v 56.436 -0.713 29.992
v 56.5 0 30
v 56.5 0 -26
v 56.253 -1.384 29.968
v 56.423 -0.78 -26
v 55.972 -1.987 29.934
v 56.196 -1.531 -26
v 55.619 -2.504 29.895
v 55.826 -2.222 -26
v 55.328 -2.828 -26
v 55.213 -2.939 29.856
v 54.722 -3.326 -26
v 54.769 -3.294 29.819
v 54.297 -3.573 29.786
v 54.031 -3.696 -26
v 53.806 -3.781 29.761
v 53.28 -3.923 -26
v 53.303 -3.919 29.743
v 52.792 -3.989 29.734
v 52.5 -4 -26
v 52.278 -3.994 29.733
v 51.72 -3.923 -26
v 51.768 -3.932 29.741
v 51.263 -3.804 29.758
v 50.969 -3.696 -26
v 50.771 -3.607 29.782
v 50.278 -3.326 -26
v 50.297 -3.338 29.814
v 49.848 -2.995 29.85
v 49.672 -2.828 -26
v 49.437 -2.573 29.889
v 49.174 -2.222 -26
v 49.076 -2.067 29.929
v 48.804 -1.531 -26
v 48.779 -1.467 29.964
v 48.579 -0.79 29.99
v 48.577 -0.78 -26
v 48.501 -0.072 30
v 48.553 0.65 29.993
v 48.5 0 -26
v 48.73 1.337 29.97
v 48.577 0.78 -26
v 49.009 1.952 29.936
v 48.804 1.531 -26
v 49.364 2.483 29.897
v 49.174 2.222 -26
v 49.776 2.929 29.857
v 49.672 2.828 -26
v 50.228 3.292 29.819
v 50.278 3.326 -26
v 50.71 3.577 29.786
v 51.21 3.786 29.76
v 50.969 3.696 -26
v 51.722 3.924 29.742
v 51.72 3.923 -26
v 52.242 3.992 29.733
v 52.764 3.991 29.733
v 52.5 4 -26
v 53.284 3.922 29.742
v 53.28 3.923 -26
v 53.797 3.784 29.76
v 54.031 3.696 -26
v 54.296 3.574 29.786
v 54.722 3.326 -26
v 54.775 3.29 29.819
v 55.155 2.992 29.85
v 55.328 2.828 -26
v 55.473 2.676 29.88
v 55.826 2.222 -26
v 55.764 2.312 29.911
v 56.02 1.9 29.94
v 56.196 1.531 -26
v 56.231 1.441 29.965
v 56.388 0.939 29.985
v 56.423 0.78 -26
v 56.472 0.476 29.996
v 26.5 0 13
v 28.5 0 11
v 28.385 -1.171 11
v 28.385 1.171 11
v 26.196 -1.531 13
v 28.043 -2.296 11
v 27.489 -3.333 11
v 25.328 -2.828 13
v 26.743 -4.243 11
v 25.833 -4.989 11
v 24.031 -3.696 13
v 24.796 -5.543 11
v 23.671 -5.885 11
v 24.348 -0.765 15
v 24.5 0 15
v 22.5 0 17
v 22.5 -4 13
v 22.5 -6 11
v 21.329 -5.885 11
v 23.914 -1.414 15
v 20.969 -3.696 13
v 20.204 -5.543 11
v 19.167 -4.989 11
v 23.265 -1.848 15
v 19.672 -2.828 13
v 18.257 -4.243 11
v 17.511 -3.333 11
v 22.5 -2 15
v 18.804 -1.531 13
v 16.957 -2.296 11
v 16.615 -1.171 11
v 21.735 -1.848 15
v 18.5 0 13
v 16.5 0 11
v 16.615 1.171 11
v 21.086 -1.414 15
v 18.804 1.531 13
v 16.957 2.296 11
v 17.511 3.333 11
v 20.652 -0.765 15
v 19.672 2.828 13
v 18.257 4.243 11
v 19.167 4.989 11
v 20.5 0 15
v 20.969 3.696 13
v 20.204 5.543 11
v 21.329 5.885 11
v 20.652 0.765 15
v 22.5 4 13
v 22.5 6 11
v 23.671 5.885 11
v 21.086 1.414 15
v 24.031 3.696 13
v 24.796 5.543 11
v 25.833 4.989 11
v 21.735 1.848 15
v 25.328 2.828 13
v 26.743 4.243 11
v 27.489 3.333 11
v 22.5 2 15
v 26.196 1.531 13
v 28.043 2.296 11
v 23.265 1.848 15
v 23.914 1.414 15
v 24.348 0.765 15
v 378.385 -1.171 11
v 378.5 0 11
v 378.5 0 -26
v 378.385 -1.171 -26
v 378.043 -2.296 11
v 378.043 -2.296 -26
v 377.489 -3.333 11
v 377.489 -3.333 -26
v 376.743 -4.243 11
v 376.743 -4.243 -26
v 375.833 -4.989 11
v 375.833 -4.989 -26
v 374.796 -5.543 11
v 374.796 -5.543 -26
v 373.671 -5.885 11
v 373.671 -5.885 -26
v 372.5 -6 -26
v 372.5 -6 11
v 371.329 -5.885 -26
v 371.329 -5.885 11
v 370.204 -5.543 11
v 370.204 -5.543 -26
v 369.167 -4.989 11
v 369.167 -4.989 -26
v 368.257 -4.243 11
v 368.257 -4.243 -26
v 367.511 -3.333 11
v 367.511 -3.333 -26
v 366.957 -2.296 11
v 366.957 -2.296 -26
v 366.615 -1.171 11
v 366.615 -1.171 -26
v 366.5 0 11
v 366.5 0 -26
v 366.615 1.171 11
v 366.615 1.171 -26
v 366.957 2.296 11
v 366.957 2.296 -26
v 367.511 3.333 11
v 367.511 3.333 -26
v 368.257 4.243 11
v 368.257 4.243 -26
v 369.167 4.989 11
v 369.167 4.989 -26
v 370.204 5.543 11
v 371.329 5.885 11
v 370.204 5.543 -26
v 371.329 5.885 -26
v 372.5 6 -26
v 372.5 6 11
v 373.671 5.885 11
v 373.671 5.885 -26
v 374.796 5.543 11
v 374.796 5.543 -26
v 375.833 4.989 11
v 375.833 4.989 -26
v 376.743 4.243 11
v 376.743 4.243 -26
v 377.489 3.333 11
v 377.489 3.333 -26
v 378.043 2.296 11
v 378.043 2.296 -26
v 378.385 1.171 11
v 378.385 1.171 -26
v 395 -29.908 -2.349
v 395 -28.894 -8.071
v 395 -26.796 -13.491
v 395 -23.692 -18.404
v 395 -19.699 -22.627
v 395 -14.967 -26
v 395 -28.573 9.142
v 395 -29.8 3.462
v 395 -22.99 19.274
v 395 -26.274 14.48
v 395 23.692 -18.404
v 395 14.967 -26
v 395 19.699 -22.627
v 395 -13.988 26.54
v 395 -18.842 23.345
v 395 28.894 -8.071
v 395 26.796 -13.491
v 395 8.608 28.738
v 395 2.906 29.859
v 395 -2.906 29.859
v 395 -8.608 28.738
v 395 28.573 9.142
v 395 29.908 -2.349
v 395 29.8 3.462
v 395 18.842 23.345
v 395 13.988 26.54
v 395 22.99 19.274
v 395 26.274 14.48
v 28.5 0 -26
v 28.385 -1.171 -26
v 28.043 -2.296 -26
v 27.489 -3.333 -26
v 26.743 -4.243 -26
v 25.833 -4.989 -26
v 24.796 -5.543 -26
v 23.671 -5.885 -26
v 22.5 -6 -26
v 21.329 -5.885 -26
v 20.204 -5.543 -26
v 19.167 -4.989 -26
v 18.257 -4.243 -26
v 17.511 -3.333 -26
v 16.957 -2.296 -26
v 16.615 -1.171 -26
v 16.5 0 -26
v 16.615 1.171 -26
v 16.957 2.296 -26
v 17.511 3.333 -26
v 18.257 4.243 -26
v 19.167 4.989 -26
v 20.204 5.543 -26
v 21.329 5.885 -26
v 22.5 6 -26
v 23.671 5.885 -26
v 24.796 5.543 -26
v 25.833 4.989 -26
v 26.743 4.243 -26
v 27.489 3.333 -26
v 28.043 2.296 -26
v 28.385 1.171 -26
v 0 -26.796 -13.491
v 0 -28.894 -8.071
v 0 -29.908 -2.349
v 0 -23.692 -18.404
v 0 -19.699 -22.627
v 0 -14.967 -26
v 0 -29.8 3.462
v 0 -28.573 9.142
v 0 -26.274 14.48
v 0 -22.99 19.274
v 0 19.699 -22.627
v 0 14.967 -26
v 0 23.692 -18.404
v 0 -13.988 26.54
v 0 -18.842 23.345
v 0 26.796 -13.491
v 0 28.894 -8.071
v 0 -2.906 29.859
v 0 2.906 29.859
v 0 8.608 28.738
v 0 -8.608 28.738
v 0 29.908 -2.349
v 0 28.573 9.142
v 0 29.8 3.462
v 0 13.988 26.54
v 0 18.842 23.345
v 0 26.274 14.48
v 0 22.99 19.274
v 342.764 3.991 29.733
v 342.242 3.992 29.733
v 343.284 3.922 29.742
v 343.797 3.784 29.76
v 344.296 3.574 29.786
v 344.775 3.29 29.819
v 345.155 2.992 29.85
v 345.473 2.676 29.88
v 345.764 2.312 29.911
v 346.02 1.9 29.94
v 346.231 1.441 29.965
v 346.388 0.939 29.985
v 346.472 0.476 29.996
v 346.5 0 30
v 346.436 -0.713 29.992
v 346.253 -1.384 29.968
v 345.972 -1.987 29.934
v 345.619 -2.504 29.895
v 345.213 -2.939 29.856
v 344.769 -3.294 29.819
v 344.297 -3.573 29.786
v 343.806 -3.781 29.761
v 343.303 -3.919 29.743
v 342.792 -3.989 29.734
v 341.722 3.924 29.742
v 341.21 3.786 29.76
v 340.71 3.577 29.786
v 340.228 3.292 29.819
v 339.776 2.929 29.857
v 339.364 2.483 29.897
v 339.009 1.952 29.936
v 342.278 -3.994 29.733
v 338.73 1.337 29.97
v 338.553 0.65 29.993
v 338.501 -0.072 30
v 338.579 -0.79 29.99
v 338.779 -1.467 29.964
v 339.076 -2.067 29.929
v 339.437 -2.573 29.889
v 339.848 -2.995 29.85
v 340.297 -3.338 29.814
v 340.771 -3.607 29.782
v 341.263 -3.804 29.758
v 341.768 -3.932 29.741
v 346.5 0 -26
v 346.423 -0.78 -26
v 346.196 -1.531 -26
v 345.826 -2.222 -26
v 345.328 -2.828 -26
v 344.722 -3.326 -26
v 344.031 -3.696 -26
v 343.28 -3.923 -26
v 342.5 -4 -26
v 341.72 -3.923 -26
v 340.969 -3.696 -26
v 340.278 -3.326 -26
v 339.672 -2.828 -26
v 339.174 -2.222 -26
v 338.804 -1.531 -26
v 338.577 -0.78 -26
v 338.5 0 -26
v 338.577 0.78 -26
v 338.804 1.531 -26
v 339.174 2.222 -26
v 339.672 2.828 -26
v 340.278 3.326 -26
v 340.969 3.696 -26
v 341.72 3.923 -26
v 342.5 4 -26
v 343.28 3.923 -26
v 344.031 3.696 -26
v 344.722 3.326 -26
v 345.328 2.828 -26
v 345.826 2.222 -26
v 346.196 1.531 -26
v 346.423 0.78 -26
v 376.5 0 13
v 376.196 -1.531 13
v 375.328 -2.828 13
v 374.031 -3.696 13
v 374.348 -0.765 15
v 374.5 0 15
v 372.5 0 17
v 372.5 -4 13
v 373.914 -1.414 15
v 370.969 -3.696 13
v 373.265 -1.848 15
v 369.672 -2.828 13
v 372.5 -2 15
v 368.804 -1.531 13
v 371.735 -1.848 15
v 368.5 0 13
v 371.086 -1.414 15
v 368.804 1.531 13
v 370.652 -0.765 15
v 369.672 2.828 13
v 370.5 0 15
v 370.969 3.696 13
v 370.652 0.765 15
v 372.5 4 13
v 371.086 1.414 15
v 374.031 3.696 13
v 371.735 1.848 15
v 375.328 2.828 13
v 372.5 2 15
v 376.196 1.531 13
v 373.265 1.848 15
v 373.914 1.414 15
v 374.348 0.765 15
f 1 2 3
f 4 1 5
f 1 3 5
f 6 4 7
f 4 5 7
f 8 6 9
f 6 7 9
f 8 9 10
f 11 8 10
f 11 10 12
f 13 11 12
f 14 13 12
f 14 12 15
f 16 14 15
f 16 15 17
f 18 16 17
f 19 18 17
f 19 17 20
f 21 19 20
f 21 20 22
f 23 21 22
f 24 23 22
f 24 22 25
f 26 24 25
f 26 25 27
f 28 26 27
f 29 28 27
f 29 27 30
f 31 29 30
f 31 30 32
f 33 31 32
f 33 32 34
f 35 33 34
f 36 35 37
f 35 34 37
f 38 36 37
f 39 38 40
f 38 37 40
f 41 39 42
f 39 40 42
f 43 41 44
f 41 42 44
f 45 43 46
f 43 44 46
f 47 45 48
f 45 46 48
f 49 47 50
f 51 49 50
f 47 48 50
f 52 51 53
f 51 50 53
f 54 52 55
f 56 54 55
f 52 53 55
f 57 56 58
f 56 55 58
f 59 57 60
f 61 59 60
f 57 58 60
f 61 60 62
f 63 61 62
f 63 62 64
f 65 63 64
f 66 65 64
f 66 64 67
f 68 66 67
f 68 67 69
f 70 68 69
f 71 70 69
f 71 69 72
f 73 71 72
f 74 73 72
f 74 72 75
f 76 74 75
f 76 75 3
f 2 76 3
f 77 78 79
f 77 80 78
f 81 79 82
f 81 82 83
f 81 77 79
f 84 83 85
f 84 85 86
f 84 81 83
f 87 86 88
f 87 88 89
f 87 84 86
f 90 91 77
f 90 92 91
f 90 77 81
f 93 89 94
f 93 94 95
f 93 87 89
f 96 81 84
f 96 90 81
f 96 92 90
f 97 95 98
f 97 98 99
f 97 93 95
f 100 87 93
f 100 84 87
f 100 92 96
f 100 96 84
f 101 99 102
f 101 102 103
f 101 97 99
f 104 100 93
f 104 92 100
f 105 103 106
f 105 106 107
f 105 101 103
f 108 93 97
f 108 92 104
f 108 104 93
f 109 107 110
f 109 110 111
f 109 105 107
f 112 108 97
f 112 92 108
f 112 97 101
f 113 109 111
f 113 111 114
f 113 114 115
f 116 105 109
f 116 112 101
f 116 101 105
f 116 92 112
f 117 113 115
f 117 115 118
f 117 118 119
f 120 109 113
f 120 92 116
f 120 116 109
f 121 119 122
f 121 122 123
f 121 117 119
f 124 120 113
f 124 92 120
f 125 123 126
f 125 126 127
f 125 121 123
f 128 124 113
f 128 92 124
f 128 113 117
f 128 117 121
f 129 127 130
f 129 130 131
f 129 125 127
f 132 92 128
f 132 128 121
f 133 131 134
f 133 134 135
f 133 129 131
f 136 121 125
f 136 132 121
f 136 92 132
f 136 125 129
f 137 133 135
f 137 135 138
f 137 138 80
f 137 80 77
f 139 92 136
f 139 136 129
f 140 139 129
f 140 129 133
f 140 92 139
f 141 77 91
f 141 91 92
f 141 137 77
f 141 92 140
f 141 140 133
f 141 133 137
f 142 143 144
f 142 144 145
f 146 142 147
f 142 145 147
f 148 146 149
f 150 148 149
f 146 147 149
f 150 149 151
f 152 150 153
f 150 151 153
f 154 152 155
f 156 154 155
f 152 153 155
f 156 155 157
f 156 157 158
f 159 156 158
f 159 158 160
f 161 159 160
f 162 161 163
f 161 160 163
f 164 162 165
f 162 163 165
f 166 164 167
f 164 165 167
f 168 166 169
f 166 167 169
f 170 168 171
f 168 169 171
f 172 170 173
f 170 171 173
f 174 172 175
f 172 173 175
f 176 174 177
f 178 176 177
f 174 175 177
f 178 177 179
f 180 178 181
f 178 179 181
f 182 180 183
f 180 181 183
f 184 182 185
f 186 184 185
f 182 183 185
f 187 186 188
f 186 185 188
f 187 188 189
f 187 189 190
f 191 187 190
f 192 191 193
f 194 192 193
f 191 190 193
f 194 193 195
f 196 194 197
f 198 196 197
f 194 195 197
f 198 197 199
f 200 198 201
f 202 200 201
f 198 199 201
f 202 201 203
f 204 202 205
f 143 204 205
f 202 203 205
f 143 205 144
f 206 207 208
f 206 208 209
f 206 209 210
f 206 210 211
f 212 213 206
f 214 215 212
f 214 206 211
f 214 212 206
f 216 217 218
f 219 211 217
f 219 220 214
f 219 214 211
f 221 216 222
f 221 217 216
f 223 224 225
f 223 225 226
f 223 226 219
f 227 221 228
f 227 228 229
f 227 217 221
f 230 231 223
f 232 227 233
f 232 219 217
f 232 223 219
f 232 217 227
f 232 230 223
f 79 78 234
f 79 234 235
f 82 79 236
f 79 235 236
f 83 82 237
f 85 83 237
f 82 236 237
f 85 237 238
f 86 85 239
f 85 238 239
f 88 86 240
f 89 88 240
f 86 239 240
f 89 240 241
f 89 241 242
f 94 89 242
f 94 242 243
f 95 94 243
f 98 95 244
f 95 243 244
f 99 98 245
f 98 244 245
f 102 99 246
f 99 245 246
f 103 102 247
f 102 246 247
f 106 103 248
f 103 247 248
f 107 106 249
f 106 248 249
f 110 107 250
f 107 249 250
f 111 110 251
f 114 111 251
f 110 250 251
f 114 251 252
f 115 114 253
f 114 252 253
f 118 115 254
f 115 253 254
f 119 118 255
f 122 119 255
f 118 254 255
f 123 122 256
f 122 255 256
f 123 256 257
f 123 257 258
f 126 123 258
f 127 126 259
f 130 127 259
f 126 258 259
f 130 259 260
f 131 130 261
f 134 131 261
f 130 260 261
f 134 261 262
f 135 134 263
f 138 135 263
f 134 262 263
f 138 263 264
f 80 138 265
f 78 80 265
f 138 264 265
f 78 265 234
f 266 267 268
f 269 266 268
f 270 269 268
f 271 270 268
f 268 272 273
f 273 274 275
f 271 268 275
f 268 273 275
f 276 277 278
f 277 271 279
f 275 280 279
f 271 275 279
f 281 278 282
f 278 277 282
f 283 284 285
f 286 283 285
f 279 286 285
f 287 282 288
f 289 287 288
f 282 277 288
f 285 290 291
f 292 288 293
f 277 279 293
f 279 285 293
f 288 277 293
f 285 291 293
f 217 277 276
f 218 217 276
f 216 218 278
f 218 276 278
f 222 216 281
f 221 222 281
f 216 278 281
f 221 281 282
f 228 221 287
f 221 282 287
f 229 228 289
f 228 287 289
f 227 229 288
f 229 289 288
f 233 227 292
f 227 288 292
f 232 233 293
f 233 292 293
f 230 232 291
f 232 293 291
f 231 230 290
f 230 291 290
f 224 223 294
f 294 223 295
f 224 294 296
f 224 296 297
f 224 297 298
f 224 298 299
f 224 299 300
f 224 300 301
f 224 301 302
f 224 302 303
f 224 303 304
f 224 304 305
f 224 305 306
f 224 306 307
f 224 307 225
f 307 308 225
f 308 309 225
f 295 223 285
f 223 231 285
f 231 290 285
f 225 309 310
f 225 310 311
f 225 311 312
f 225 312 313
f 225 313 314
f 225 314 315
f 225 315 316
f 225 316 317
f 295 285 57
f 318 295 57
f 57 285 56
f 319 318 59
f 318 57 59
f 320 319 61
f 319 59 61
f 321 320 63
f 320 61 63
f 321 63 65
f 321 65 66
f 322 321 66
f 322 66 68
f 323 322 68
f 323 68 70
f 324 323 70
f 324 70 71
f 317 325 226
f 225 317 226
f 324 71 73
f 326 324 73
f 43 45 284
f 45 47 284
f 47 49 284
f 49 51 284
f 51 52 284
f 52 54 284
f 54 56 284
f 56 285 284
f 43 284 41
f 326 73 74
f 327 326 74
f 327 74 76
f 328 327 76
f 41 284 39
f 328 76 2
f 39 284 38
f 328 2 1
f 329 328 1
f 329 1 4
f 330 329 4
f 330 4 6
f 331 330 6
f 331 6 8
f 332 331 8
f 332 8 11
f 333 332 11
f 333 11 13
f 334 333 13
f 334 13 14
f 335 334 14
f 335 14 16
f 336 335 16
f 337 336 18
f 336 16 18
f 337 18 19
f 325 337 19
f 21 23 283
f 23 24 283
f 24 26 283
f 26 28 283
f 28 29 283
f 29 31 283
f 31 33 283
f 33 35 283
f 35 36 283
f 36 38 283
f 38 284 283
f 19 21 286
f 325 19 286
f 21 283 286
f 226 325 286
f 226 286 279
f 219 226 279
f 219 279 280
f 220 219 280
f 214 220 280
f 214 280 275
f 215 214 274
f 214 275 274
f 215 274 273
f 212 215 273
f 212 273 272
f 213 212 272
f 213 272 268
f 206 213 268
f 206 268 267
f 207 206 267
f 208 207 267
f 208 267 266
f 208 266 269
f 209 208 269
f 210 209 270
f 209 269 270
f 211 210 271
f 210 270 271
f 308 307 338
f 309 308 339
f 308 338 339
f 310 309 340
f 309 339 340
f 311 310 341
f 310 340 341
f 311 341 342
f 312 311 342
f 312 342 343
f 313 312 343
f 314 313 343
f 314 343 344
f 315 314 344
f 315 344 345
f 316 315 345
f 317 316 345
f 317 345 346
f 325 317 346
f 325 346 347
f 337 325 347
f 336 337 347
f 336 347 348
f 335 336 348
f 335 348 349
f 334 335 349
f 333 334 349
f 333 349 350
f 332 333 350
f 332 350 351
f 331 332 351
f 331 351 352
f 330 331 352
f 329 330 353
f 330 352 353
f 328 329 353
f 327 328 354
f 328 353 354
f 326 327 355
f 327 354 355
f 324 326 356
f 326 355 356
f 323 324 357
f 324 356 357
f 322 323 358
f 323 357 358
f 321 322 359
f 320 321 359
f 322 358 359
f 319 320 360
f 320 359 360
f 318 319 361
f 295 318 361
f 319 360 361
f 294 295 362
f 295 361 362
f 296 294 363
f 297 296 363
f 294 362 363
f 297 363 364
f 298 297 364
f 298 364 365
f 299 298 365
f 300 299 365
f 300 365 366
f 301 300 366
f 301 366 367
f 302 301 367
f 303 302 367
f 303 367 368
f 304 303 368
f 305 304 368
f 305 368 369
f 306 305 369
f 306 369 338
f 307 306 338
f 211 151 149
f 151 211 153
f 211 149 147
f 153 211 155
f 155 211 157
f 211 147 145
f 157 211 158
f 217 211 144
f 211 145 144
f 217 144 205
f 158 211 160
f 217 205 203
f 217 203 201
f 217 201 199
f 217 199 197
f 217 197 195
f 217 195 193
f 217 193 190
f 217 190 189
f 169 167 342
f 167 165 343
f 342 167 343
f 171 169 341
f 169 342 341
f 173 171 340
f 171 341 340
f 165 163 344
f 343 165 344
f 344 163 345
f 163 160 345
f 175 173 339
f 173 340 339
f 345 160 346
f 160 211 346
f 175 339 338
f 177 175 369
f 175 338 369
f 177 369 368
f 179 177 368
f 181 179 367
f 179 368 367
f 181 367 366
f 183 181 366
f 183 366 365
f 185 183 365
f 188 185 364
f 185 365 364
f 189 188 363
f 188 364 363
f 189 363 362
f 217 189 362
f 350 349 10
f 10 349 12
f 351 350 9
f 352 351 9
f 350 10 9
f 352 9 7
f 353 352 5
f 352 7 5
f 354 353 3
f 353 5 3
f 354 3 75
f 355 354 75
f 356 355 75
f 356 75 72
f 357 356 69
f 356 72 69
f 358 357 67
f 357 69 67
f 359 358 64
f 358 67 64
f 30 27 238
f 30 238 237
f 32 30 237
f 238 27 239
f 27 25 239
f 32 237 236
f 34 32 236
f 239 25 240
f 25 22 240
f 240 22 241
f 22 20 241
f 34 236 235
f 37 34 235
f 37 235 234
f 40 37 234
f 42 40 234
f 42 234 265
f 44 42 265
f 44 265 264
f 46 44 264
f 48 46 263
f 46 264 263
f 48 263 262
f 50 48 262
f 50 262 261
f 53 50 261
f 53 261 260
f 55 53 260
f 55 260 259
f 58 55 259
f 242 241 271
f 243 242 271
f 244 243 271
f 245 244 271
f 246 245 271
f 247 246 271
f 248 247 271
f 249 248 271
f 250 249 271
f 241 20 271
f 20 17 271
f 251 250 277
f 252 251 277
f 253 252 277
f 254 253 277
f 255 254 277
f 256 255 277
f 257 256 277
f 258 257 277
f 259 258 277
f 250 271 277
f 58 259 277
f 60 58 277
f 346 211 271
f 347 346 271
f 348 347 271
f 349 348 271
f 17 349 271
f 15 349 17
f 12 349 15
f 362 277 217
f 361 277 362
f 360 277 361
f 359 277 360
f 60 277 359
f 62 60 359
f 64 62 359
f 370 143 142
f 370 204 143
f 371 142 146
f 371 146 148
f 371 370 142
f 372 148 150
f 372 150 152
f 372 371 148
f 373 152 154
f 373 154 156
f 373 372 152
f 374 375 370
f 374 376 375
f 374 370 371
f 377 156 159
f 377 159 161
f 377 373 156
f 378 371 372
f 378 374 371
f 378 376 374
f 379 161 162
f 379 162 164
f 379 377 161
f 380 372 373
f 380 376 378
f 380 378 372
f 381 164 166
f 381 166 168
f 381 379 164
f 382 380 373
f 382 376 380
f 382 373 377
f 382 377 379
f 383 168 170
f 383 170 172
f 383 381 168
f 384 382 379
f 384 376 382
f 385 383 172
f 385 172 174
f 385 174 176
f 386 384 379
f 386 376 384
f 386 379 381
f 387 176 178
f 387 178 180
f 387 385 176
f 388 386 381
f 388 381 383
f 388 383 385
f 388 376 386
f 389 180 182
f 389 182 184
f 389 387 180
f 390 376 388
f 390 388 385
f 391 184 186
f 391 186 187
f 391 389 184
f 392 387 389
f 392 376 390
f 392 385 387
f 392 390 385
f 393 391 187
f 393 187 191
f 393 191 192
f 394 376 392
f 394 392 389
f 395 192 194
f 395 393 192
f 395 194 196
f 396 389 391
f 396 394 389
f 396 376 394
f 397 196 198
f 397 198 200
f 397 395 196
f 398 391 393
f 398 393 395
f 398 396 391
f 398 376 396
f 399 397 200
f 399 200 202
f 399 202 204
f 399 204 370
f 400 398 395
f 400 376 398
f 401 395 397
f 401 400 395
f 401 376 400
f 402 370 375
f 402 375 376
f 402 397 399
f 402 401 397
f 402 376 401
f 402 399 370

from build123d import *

# Parameters (mm, degrees)
F1_DEPTH = 395
F2_R     = 6
F2_R_2   = 4
F3_DEPTH = 43
F4_R     = 4
F5_DEPTH = 71
F6_SIZE  = 6


with BuildPart() as f1:
    # F0 (on Right) → F1 (new body)
    with BuildSketch(Plane.YZ):
        with BuildLine():
            Line((-14.96663, -26), (14.96663, -26))
            ThreePointArc((14.96663, -26), (0, 30), (-14.96663, -26))
        make_face()
    extrude(amount=F1_DEPTH)

    # F2 (on face) → F3 (cut)
    with BuildSketch(Plane(origin=(0, 0, -26), x_dir=(1, 0, 0), z_dir=(0, 0, -1))):
        with Locations((372.5, 0)):
            Circle(F2_R)
        with Locations((22.5, 0)):
            Circle(F2_R)
        with Locations((52.5, 0)):
            Circle(F2_R_2)
        with Locations((342.5, 0)):
            Circle(F2_R_2)
    extrude(amount=-F3_DEPTH, mode=Mode.SUBTRACT)

    # F4 (on face) → F5 (cut)
    with BuildSketch(Plane(origin=(0, 0, -26), x_dir=(1, 0, 0), z_dir=(0, 0, -1))):
        with Locations((52.5, 0)):
            Circle(F4_R)
        with Locations((342.5, 0)):
            Circle(F4_R)
    extrude(amount=-F5_DEPTH, mode=Mode.SUBTRACT)

    # F6
    f6_edges = [f1.edges().sort_by_distance(p)[0] for p in [
        (366.5, 0, 17),
        (16.5, 0, 17),
    ]]
    chamfer(f6_edges, length=F6_SIZE)


solid = f1.part
